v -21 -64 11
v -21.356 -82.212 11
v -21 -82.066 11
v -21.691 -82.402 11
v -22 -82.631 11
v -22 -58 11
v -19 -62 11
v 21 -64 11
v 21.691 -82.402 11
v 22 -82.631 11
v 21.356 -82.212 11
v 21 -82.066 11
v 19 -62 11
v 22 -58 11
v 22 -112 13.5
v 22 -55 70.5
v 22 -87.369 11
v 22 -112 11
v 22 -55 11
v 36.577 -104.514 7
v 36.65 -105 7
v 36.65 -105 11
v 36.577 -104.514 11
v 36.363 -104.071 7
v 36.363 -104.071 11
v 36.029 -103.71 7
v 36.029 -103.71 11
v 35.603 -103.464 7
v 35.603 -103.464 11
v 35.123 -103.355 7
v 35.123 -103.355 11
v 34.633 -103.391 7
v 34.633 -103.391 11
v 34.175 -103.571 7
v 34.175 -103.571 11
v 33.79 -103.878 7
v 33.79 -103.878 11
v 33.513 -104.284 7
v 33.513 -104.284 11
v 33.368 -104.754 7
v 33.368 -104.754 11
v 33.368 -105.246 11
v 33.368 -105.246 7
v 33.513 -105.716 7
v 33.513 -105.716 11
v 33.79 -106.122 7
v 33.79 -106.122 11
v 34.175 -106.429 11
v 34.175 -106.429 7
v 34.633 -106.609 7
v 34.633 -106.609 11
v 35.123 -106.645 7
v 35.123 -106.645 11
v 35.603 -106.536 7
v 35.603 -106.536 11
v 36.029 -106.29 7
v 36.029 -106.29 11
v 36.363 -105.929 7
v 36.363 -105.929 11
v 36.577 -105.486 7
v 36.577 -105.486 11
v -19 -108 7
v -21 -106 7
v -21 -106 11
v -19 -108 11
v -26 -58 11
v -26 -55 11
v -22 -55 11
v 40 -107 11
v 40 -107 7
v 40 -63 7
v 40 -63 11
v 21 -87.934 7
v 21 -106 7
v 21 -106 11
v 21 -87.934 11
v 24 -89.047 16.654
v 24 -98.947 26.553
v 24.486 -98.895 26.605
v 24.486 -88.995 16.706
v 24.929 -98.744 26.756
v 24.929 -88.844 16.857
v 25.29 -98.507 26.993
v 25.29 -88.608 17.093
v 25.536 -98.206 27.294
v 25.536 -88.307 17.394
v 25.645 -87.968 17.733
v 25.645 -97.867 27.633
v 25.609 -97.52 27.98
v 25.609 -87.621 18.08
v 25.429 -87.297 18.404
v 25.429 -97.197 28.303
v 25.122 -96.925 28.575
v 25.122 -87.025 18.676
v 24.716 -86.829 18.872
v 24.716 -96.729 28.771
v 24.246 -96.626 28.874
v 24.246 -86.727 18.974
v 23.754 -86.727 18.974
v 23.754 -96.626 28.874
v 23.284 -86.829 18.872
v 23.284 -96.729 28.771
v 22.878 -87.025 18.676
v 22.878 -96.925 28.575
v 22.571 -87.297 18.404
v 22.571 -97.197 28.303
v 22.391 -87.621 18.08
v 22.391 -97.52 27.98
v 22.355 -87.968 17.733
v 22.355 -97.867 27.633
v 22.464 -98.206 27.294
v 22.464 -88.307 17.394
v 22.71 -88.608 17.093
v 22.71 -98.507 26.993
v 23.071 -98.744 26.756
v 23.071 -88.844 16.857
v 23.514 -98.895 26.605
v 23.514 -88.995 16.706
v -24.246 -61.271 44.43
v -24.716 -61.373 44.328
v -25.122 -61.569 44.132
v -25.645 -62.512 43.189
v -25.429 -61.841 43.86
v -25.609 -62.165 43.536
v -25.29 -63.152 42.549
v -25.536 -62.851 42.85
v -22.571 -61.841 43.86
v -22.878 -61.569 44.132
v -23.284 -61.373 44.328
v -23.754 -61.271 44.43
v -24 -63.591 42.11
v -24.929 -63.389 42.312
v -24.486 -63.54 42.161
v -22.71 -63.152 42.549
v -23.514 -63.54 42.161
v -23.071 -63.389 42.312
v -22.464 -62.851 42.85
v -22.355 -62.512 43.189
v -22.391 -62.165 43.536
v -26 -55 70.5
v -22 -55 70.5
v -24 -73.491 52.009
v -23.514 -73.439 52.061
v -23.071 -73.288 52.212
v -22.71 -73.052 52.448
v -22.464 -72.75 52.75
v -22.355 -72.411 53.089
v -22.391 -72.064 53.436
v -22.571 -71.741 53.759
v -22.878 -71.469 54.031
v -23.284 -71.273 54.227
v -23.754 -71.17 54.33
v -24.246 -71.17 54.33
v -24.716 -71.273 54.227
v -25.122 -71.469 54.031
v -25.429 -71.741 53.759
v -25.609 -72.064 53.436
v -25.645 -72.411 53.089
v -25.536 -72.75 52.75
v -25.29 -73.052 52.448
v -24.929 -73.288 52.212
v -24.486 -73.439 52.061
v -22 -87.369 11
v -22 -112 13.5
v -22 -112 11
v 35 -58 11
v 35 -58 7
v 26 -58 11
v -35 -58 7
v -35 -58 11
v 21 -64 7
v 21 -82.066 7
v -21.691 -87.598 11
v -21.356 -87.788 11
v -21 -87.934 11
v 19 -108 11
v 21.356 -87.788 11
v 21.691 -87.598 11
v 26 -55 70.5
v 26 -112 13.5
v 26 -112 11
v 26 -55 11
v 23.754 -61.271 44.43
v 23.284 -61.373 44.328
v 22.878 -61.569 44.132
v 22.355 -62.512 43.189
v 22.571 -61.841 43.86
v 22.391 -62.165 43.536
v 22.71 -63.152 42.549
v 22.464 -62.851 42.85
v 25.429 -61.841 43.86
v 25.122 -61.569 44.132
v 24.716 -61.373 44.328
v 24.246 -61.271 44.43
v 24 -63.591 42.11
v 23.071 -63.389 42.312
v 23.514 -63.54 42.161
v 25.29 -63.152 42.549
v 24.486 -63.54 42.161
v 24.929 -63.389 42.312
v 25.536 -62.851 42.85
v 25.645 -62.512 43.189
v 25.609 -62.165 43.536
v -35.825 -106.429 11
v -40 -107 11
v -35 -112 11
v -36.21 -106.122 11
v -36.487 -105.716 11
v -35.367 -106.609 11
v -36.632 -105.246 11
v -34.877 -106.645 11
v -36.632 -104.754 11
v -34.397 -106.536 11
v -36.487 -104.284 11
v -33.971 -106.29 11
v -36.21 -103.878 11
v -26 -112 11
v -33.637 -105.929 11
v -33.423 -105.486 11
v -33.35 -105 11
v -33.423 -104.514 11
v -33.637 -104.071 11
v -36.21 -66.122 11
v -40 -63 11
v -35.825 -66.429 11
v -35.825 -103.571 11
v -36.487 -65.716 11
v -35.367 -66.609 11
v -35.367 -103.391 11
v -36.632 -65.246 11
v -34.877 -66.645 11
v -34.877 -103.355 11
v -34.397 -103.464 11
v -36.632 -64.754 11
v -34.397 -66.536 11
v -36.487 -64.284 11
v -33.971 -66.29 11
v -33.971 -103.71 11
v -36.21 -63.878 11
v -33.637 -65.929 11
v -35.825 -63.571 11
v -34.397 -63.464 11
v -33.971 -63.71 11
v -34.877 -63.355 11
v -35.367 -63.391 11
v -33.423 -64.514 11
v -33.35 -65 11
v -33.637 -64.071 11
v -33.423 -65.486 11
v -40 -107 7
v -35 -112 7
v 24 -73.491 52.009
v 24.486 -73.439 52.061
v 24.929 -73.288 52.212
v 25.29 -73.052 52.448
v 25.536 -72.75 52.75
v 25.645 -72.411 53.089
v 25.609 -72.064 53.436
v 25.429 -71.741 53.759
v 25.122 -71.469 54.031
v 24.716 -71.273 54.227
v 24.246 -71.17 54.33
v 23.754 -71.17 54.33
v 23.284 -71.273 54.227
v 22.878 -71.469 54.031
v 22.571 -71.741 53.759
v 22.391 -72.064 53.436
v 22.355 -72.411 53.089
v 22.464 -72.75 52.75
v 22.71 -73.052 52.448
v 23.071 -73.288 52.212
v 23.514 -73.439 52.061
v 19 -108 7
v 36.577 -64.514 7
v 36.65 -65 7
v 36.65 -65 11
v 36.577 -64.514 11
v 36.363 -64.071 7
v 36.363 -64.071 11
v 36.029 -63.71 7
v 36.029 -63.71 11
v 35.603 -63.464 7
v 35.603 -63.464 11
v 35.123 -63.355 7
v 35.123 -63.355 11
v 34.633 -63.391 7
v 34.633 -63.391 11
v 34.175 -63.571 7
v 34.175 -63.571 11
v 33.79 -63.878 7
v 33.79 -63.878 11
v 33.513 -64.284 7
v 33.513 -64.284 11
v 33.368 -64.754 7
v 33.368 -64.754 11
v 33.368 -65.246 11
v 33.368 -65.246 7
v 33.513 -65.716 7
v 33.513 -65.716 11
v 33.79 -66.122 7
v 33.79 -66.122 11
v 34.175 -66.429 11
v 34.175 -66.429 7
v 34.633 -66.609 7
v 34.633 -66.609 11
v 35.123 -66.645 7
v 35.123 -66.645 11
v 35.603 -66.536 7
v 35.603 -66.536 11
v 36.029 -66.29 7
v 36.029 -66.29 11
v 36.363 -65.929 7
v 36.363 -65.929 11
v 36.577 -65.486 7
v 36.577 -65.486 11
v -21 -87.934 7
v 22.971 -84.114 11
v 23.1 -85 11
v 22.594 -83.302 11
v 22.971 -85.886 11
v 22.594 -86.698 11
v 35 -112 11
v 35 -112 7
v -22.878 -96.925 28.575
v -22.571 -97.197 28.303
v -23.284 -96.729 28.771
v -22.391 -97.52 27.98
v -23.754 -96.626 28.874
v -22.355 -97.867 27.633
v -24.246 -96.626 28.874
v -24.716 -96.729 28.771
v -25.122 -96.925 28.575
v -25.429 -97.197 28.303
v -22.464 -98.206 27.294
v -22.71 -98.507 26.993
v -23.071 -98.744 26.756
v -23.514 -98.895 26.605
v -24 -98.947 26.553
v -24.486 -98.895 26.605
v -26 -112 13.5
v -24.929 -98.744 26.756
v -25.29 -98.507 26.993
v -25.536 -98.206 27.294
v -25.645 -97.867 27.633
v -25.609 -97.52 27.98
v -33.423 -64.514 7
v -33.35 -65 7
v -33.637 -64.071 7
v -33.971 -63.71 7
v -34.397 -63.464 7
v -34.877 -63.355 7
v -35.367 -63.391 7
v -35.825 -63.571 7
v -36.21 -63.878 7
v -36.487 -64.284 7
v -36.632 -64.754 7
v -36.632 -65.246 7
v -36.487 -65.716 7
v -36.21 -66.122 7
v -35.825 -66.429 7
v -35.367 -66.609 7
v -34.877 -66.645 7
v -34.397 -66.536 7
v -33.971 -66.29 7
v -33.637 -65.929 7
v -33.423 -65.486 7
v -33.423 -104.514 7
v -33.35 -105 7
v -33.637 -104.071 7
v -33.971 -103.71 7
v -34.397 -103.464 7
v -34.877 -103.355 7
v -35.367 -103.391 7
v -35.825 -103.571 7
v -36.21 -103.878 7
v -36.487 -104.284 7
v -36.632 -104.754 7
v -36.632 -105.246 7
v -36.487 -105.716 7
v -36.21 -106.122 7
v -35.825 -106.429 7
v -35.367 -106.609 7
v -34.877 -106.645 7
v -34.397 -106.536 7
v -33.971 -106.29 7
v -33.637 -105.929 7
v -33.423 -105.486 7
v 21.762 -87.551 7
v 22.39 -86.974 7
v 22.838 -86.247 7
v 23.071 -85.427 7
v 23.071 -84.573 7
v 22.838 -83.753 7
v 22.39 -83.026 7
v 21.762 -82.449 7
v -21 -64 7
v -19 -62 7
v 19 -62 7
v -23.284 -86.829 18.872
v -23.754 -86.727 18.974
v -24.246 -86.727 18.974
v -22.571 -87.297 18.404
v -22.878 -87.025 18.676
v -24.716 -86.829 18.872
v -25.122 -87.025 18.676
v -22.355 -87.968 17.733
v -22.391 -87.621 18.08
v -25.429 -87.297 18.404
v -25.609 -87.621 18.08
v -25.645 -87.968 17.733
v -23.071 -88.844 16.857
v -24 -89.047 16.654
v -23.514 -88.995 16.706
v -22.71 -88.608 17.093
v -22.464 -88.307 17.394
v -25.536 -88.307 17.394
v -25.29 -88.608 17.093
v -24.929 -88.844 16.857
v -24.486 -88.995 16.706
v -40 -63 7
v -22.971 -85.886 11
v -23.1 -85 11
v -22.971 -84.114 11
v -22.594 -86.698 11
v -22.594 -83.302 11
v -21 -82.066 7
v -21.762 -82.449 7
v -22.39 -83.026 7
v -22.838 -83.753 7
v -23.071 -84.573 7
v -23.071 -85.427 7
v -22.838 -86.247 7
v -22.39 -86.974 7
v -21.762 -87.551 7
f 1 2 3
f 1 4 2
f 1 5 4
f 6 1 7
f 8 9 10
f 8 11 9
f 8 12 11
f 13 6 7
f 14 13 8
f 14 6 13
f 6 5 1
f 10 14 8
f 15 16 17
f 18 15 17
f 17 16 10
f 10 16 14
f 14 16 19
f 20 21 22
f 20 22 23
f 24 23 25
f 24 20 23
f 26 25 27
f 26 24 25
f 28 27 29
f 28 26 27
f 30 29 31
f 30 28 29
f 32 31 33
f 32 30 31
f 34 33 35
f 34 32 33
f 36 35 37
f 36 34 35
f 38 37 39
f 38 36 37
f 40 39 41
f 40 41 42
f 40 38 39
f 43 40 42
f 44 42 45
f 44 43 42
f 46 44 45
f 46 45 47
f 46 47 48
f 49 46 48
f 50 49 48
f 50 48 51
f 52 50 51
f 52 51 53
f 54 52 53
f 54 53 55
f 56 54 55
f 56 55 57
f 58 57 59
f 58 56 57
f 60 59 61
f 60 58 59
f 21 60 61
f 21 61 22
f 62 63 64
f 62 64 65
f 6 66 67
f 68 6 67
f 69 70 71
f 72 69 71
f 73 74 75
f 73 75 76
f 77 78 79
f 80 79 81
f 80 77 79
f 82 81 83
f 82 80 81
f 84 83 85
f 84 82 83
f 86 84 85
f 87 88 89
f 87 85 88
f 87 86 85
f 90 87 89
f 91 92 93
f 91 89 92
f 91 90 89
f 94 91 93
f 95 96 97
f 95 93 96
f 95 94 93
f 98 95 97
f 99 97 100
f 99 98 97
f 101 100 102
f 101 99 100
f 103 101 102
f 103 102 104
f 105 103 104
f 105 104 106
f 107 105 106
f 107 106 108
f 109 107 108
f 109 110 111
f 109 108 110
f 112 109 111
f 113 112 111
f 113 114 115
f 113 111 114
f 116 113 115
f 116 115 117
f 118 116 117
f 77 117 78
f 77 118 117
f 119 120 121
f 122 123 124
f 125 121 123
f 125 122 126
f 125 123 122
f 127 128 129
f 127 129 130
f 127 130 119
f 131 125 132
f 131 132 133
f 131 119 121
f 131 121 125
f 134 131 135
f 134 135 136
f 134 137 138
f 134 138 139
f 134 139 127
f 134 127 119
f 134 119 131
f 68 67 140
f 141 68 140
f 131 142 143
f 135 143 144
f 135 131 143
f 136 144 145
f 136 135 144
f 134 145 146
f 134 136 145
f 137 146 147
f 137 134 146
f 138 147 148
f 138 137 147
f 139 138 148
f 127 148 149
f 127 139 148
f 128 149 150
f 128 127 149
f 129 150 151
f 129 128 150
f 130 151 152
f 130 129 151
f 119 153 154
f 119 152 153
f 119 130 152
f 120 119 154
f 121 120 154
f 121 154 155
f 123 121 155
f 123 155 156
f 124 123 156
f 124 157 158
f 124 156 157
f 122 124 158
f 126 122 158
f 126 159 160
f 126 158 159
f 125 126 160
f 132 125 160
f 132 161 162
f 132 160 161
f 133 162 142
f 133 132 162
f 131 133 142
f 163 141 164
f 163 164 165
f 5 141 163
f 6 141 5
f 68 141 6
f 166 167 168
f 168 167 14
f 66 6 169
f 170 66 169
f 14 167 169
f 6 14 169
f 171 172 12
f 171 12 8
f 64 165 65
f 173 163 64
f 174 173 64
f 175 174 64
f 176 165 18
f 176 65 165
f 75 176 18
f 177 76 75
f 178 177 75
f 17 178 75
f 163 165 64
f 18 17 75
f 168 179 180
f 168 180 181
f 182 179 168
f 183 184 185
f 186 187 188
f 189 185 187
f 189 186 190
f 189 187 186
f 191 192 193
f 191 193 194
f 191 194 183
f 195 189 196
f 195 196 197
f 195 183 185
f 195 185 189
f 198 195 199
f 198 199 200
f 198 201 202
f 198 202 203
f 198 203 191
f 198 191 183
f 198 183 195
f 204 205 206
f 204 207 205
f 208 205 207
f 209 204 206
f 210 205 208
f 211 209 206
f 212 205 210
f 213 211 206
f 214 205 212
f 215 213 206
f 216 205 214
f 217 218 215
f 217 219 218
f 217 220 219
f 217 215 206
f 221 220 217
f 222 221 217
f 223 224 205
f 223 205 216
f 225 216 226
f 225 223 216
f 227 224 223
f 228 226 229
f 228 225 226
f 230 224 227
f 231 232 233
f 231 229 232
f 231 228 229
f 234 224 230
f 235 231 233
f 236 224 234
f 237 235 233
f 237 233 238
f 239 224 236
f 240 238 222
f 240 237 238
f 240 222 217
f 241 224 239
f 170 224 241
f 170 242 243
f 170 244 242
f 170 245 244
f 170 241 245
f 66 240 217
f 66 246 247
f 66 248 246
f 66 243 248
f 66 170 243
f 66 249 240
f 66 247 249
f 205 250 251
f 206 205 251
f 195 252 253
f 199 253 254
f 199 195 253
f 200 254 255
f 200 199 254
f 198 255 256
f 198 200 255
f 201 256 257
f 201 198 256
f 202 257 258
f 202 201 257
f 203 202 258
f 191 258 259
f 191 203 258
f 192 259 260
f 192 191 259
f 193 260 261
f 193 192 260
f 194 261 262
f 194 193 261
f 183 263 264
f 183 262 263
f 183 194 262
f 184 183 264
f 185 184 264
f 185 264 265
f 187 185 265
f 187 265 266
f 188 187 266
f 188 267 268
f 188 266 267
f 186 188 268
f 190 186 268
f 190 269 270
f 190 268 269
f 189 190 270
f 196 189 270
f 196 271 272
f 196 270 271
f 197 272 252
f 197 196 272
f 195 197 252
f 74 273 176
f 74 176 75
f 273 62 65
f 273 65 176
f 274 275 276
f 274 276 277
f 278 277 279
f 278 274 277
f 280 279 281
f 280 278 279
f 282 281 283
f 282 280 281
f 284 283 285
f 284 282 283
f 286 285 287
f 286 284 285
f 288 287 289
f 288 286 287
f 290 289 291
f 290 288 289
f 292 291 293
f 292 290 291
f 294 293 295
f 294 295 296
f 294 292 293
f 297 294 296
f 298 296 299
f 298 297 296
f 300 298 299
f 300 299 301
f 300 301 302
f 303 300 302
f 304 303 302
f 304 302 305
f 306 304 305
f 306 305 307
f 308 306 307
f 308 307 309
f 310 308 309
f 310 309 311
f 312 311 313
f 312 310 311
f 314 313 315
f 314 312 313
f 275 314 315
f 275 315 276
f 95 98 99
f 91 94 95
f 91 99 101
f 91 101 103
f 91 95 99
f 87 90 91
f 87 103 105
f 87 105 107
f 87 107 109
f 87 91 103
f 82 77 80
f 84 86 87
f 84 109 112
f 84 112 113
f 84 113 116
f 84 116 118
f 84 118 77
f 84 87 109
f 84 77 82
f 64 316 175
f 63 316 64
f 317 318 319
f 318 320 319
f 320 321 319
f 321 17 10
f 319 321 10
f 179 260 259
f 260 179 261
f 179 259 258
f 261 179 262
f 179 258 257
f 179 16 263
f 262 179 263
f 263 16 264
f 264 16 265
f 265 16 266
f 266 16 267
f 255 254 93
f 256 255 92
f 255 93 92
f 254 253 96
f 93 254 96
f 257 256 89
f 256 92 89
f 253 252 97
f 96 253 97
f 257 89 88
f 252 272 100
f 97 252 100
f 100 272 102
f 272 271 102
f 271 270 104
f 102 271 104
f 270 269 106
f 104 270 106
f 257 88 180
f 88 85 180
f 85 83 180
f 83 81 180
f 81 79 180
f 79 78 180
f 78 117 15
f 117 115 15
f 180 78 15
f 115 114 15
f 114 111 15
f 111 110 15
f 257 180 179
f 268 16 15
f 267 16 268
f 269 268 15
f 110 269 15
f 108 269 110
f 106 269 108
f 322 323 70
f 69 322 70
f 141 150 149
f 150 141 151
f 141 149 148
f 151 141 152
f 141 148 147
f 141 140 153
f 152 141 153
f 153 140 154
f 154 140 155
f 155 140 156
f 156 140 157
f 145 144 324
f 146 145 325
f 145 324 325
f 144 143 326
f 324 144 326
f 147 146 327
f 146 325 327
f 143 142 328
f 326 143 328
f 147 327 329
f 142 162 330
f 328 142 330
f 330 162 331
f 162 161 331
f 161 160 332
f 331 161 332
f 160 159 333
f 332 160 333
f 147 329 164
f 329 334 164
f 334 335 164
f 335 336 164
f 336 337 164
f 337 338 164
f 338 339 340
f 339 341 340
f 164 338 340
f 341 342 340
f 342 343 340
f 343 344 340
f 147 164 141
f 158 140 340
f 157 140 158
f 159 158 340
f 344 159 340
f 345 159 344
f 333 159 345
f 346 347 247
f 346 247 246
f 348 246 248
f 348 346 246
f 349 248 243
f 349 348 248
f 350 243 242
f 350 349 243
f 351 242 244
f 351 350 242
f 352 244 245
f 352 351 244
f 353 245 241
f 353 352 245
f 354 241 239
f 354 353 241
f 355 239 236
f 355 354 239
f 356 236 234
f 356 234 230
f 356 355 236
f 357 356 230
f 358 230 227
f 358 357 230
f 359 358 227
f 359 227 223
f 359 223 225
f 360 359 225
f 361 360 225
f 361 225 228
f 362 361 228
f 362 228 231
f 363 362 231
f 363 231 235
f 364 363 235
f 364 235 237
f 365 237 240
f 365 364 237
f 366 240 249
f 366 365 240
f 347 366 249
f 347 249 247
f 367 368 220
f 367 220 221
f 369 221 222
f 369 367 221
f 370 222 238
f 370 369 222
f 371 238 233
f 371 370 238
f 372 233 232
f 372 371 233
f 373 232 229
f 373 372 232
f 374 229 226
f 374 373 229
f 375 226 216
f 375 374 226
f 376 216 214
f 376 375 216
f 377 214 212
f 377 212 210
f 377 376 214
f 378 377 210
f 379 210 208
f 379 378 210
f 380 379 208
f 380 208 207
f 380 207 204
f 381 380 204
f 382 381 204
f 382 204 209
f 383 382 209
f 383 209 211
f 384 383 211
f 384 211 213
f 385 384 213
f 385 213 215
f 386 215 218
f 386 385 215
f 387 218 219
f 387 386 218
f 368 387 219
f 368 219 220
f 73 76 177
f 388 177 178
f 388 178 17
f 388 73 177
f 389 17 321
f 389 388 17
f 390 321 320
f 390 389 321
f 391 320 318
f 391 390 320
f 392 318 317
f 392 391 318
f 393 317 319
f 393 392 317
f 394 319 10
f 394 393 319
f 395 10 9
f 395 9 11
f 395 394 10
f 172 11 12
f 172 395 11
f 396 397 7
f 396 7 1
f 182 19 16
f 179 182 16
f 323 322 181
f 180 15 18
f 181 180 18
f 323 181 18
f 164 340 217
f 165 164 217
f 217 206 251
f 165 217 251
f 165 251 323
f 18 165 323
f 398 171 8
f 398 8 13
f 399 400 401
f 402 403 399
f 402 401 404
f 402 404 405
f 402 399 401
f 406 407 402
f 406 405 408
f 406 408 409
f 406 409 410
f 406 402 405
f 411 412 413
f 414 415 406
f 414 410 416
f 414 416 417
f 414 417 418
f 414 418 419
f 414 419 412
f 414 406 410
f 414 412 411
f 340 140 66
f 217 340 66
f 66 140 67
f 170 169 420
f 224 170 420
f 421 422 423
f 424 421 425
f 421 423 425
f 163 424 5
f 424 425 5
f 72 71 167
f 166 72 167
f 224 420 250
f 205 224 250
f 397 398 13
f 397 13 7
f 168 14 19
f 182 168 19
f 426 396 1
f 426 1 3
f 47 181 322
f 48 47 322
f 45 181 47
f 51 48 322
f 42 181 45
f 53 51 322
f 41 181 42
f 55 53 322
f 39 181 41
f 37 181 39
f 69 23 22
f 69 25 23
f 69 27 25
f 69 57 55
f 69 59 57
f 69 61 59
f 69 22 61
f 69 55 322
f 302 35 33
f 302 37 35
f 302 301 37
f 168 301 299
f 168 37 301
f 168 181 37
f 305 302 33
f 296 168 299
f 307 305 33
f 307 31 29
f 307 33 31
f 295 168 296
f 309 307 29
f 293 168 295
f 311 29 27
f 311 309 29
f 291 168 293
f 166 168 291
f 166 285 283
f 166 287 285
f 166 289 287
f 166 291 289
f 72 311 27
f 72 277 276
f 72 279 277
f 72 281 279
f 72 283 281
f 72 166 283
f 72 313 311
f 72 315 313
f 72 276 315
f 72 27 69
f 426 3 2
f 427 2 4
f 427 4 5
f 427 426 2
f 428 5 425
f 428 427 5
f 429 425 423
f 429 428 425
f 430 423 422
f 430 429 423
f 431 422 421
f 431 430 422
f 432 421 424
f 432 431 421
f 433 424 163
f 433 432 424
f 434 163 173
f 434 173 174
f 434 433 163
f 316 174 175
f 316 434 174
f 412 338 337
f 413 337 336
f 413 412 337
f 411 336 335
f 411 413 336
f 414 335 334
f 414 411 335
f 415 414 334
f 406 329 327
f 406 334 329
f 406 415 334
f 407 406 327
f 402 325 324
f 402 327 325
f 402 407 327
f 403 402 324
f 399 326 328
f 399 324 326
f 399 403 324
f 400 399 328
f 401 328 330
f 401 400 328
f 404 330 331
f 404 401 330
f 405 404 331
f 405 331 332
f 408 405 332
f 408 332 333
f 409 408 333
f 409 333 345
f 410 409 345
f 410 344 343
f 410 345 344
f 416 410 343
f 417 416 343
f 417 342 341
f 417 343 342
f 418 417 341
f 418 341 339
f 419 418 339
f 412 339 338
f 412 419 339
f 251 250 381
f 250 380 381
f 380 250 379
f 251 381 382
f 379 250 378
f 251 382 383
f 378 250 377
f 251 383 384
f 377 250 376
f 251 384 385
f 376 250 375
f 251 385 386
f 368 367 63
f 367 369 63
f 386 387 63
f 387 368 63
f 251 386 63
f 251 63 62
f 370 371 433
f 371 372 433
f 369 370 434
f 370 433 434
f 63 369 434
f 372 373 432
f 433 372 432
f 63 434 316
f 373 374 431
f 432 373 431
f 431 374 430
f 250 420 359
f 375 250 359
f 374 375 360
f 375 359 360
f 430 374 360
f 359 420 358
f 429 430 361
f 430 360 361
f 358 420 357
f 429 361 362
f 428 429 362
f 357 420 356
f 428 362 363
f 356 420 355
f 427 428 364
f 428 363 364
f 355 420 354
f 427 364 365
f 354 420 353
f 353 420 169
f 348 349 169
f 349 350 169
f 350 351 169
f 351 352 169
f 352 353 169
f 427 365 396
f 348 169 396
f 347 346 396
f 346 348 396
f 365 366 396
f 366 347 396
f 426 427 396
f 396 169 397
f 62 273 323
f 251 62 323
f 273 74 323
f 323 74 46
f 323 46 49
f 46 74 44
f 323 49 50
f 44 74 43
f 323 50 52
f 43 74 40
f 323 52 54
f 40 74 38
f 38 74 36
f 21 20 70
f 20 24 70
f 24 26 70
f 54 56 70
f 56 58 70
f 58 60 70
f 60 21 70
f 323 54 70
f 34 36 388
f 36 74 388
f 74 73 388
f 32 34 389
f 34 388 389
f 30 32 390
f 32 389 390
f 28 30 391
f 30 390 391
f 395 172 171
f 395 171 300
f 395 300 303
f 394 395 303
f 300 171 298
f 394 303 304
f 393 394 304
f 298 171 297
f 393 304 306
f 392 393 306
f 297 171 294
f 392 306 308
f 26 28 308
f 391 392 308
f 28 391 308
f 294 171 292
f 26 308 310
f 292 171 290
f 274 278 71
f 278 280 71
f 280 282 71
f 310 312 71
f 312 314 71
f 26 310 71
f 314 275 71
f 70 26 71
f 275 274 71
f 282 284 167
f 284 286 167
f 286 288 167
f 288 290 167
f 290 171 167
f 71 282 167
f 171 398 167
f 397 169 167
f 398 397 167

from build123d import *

# Parameters (mm, degrees)
F_4MM_START                  = 7
SKETCH_1_R                   = 1.65
F_4MM_DEPTH                  = 4
EXTRUDE_START                = -26
EXTRUDE_45_1_DEPTH           = 4
EXTRUDE_START_2              = 22
EXTRUDE_45_1_2_DEPTH         = 4
CUT_EXTRUDE_48X36_DEPTH      = 14
CUT_EXTRUDE_48X36_DEPTH_BACK = 14
SKETCH_4_R                   = 1.65
CUT_EXTRUDE_START            = 7
SKETCH_5_R                   = 3.1
CUT_EXTRUDE_631_DEPTH        = 4


with BuildPart() as part:
    # Sketch 1 → 4mm (new body)
    with BuildSketch(Plane.XY.offset(F_4MM_START)):
        Polygon((-35, -112), (35, -112), (40, -107), (40, -63), (35, -58), (-35, -58), (-40, -63), (-40, -107), align=None)
        with Locations((-35, -105)):
            Circle(SKETCH_1_R, mode=Mode.SUBTRACT)
        with Locations((-35, -65)):
            Circle(SKETCH_1_R, mode=Mode.SUBTRACT)
        with Locations((35, -105)):
            Circle(SKETCH_1_R, mode=Mode.SUBTRACT)
        with Locations((35, -65)):
            Circle(SKETCH_1_R, mode=Mode.SUBTRACT)
        Polygon((-19, -108), (19, -108), (21, -106), (21, -64), (19, -62), (-19, -62), (-21, -64), (-21, -106), align=None, mode=Mode.SUBTRACT)
    extrude(amount=F_4MM_DEPTH)

    # Sketch 2 → Extrude 45__-1 (add)
    with BuildSketch(Plane(origin=(0, 0, 0), x_dir=(0, 0, -1), z_dir=(1, 0, 0)).offset(EXTRUDE_START)):
        Polygon((-11, -112), (-11, -55), (-70.5, -55), (-13.5, -112), align=None)
    extrude(amount=EXTRUDE_45_1_DEPTH)

    # Sketch 3 → Extrude 45__1 2 (add)
    with BuildSketch(Plane(origin=(0, 0, 0), x_dir=(0, 0, -1), z_dir=(1, 0, 0)).offset(EXTRUDE_START_2)):
        Polygon((-11, -112), (-11, -55), (-70.5, -55), (-13.5, -112), align=None)
    extrude(amount=EXTRUDE_45_1_2_DEPTH)

    # Sketch 4 → Cut-Extrude 48x36 (cut, two sides: drawn at the far end of the back side and taken through both)
    with BuildSketch(Plane(origin=(0, -62.75, 62.75), x_dir=(1, 0, 0), z_dir=(0, -0.7071067811865475, 0.7071067811865476)).offset(-CUT_EXTRUDE_48X36_DEPTH_BACK)):
        with Locations(Location((-24, -49.539844892, 0), (0, 0, 270))):
            Circle(SKETCH_4_R)
        with Locations(Location((-24, -13.539844892, 0), (0, 0, 270))):
            Circle(SKETCH_4_R)
        with Locations(Location((24, -49.539844892, 0), (0, 0, 270))):
            Circle(SKETCH_4_R)
        with Locations(Location((24, -13.539844892, 0), (0, 0, 270))):
            Circle(SKETCH_4_R)
    extrude(amount=CUT_EXTRUDE_48X36_DEPTH + CUT_EXTRUDE_48X36_DEPTH_BACK, mode=Mode.SUBTRACT)

    # Sketch 5 → Cut-Extrude 631 (cut)
    with BuildSketch(Plane.XY.offset(CUT_EXTRUDE_START)):
        with Locations((-20, -85)):
            Circle(SKETCH_5_R)
        with Locations((20, -85)):
            Circle(SKETCH_5_R)
    extrude(amount=CUT_EXTRUDE_631_DEPTH, mode=Mode.SUBTRACT)


solid = part.part
